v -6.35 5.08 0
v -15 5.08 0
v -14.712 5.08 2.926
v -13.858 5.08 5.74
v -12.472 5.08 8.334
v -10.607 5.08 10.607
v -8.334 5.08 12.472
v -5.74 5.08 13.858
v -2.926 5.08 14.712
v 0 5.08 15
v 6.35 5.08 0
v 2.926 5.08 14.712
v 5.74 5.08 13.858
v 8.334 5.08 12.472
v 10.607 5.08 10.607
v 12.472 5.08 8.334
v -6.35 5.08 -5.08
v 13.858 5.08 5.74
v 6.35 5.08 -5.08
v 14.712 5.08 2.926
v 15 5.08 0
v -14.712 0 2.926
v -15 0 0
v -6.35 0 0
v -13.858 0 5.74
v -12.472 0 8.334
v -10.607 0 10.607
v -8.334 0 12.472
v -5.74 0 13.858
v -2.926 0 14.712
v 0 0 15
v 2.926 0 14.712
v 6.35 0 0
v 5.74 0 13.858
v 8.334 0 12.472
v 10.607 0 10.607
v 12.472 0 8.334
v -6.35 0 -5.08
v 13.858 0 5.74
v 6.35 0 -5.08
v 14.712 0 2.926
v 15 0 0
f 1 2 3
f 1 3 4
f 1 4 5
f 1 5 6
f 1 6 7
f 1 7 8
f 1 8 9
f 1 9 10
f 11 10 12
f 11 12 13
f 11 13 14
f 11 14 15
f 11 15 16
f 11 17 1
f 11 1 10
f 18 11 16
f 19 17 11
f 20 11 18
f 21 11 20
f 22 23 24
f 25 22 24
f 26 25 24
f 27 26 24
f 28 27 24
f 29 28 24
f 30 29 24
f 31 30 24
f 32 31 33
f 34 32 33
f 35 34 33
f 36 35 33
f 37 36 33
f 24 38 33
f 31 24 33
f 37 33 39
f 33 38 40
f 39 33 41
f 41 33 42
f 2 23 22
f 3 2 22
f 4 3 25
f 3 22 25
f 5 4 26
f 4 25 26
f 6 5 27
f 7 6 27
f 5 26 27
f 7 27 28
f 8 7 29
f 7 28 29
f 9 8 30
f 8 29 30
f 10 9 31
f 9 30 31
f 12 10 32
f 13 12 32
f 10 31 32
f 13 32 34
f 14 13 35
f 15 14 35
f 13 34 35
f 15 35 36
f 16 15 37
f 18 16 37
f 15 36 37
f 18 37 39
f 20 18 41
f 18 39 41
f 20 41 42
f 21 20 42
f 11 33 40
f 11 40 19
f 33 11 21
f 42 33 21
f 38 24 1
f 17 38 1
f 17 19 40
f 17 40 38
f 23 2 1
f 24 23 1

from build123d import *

# Parameters (mm, degrees)
SKETCH1_R           = 15
BOSS_EXTRUDE1_DEPTH = 5.08
SKETCH2_W           = 841.216063822
SKETCH2_H           = 769.249769976
CUT_EXTRUDE1_DEPTH  = 5.08
SKETCH3_W           = 12.7
SKETCH3_H           = 5.08
BOSS_EXTRUDE2_DEPTH = 5.08


with BuildPart() as part:
    # Sketch1 → Boss-Extrude1 (new body)
    with BuildSketch(Plane(origin=(0, 0, 0), x_dir=(1, 0, 0), z_dir=(0, 1, 0))):
        Circle(SKETCH1_R)
    extrude(amount=BOSS_EXTRUDE1_DEPTH)

    # Sketch2 → Cut-Extrude1 (cut)
    with BuildSketch(Plane(origin=(0, 5.08, 0), x_dir=(1, 0, 0), z_dir=(0, 1, 0))):
        with Locations((-405.608031911, 384.624884988)):
            Rectangle(SKETCH2_W, SKETCH2_H)
    extrude(amount=-CUT_EXTRUDE1_DEPTH, mode=Mode.SUBTRACT)

    # Sketch3 → Boss-Extrude2 (add)
    with BuildSketch(Plane(origin=(0, 0, 0), x_dir=(-1, 0, 0), z_dir=(0, 0, -1))):
        with Locations((0, 2.54)):
            Rectangle(SKETCH3_W, SKETCH3_H)
    extrude(amount=BOSS_EXTRUDE2_DEPTH)


solid = part.part
